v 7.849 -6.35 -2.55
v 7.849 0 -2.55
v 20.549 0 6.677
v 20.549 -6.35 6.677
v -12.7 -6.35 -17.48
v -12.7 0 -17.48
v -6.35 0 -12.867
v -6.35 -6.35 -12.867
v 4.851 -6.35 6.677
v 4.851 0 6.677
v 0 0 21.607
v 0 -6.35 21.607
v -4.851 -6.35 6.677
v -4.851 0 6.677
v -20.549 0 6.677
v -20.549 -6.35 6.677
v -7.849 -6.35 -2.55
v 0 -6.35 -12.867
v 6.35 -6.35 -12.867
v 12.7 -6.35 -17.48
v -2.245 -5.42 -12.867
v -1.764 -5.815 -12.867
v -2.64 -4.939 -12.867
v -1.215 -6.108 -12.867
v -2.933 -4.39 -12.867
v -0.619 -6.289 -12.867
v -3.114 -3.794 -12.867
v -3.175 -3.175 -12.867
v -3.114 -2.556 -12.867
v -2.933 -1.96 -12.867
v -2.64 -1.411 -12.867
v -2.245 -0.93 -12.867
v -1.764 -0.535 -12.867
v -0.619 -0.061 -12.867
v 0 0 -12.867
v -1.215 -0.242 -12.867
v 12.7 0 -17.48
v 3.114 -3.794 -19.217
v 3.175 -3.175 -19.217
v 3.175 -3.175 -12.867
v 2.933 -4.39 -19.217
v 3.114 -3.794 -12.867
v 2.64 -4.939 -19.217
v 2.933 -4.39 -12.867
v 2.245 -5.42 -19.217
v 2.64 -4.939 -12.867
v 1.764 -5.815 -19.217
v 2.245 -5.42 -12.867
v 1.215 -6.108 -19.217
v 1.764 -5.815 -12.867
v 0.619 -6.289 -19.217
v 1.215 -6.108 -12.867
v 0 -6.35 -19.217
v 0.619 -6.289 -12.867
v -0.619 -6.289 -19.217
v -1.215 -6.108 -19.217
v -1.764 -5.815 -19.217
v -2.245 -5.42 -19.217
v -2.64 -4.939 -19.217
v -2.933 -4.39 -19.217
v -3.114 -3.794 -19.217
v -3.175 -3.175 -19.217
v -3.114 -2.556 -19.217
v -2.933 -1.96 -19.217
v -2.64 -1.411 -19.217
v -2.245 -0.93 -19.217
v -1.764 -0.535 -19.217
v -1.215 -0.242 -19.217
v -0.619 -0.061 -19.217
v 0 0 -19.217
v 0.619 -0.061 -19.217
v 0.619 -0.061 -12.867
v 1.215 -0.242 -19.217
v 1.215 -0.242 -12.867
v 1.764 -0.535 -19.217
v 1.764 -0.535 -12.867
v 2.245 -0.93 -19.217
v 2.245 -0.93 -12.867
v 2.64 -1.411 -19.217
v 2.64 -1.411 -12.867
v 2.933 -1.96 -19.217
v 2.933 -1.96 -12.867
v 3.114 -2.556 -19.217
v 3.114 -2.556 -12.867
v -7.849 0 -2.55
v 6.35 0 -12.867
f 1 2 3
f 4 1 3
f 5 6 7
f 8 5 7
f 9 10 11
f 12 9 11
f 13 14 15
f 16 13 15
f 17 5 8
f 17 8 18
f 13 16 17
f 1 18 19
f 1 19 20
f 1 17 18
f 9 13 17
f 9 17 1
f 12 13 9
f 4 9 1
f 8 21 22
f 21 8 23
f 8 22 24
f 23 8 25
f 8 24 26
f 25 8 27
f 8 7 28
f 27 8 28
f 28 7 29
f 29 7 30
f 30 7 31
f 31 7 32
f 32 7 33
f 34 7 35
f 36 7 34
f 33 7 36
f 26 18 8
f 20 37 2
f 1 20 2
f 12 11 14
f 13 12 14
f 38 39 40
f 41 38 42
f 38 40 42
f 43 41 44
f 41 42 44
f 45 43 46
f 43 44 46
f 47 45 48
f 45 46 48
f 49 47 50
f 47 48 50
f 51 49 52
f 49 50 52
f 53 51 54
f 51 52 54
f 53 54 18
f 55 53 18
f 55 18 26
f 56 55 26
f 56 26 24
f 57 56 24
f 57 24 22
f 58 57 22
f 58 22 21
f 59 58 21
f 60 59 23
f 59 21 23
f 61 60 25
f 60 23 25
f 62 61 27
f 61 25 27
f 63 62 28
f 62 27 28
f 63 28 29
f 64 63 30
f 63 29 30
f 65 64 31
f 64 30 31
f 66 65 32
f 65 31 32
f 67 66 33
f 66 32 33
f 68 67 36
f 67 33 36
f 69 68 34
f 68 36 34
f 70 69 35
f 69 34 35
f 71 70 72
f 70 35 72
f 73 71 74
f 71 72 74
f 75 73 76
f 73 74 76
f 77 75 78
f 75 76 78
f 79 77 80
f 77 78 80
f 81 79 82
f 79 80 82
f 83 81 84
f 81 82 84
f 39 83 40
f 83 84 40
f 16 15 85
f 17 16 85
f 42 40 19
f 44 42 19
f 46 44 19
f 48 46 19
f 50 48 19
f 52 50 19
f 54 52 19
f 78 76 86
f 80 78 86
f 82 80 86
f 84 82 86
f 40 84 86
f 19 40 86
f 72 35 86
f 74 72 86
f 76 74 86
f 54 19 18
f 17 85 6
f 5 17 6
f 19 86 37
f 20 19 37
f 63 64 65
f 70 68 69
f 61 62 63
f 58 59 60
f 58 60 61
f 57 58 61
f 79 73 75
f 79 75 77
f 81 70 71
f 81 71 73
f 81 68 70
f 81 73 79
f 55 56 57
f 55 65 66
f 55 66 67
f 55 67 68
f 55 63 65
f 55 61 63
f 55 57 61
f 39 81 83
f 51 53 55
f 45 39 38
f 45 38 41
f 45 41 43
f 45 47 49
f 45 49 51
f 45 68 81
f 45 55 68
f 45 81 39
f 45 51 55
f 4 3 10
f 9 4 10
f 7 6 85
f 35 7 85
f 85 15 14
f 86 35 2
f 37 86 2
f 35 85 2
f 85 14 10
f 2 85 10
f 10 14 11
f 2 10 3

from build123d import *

# Parameters (mm, degrees)
F1_DEPTH = 6.35
F2_R     = 3.175
F3_DEPTH = 6.35


with BuildPart() as f1:
    # F0 (on Front) → F1 (new body)
    with BuildSketch(Plane.XZ):
        Polygon((4.850968, 6.676785), (0, 21.606531), (-4.850968, 6.676785), (-20.549032, 6.676785), (-7.849032, -2.550305), (-12.7, -17.48005), (-6.35, -12.866505), (6.35, -12.866505), (12.7, -17.48005), (7.849032, -2.550305), (20.549032, 6.676785), align=None)
    extrude(amount=F1_DEPTH)

    # F2 (on face) → F3 (join)
    with BuildSketch(Plane(origin=(0, 0, -12.866505), x_dir=(1, 0, 0), z_dir=(0, 0, -1))):
        with Locations((0, 3.175)):
            Circle(F2_R)
    extrude(amount=F3_DEPTH)


solid = f1.part
